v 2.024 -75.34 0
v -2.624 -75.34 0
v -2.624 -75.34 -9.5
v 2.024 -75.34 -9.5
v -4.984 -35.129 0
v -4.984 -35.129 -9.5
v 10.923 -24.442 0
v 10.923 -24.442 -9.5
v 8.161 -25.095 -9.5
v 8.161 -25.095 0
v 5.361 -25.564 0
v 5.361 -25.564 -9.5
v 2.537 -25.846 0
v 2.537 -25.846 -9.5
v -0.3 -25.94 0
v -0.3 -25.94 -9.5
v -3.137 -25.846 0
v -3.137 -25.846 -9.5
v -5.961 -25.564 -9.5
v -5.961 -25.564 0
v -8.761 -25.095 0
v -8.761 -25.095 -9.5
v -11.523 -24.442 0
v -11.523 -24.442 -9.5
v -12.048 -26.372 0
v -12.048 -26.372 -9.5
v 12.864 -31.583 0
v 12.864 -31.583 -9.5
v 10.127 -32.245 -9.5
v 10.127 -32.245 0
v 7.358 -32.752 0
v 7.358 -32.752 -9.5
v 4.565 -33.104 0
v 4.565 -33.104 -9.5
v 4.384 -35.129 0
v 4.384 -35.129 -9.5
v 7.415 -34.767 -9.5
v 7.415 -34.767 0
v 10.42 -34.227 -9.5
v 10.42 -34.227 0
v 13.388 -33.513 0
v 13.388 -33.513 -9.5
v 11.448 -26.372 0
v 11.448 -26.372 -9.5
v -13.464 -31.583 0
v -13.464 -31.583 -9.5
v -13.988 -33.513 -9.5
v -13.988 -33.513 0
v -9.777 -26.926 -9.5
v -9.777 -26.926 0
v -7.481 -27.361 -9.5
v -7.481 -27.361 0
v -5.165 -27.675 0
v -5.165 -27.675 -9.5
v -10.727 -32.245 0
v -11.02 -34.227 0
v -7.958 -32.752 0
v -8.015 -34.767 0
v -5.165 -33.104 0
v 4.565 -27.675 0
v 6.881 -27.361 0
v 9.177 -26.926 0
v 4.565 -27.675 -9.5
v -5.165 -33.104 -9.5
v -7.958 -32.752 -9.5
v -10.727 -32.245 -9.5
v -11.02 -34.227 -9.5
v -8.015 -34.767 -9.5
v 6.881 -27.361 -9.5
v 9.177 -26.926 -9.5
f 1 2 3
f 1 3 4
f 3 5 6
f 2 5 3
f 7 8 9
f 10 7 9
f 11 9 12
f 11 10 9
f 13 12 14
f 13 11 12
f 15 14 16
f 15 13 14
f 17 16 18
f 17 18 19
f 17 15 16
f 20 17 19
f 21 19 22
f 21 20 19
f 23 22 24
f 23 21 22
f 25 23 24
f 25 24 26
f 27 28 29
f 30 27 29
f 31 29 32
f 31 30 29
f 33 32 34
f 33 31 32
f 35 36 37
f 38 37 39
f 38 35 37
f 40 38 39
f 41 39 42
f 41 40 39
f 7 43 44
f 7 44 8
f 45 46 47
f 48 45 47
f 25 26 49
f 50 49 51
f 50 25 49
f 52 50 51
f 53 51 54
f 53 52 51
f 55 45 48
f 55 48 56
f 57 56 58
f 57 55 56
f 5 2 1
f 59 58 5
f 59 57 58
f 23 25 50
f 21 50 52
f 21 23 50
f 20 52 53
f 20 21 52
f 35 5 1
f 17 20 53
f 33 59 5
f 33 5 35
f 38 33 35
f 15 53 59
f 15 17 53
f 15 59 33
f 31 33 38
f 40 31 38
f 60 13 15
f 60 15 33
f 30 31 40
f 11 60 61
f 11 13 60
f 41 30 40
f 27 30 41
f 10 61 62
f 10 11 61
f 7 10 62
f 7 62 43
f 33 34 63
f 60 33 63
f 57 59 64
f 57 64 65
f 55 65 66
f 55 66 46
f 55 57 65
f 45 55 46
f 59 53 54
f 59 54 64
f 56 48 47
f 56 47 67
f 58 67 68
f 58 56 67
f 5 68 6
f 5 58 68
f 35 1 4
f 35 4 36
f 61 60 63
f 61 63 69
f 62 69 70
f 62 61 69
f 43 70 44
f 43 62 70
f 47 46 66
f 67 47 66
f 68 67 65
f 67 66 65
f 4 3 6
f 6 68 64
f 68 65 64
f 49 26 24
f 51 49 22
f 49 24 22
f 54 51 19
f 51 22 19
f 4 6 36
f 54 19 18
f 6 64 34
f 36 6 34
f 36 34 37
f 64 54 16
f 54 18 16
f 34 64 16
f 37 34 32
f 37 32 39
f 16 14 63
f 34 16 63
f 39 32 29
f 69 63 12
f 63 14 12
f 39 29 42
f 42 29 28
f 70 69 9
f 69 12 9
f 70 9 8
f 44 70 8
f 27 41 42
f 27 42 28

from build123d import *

# Parameters (mm, degrees)
BOSS_EXTRUDE1_DEPTH = 9.5


with BuildPart() as part:
    # Sketch1 → Boss-Extrude1 (new body)
    with BuildSketch(Plane.XY):
        with BuildLine():
            Line((-5.165155755, -27.675045296), (-5.165155755, -33.10368941))
            ThreePointArc((-5.165155755, -33.10368941), (-9.346333037, -32.518171884), (-13.463522621, -31.583386259))
            Line((-13.463522621, -31.583386259), (-13.987965753, -33.513401647))
            ThreePointArc((-13.987965753, -33.513401647), (-9.521266094, -34.519064332), (-4.983625309, -35.129457142))
            Line((-4.983625309, -35.129457142), (-2.624414585, -75.34))
            Line((-2.624414585, -75.34), (2.024414585, -75.34))
            Line((2.024414585, -75.34), (4.383625309, -35.129457142))
            ThreePointArc((4.383625309, -35.129457142), (8.921266094, -34.519064332), (13.387965753, -33.513401647))
            Line((13.387965753, -33.513401647), (12.863522621, -31.583386259))
            ThreePointArc((12.863522621, -31.583386259), (8.746333037, -32.518171884), (4.565155755, -33.10368941))
            Line((4.565155755, -33.10368941), (4.565155755, -27.675045296))
            ThreePointArc((4.565155755, -27.675045296), (8.031839973, -27.15841027), (11.447526164, -26.372344709))
            Line((11.447526164, -26.372344709), (10.923083031, -24.44232932))
            ThreePointArc((10.923083031, -24.44232932), (-0.3, -25.94), (-11.523083031, -24.44232932))
            Line((-11.523083031, -24.44232932), (-12.047526164, -26.372344709))
            ThreePointArc((-12.047526164, -26.372344709), (-8.631839973, -27.15841027), (-5.165155755, -27.675045296))
        make_face()
    extrude(amount=-BOSS_EXTRUDE1_DEPTH)


solid = part.part
